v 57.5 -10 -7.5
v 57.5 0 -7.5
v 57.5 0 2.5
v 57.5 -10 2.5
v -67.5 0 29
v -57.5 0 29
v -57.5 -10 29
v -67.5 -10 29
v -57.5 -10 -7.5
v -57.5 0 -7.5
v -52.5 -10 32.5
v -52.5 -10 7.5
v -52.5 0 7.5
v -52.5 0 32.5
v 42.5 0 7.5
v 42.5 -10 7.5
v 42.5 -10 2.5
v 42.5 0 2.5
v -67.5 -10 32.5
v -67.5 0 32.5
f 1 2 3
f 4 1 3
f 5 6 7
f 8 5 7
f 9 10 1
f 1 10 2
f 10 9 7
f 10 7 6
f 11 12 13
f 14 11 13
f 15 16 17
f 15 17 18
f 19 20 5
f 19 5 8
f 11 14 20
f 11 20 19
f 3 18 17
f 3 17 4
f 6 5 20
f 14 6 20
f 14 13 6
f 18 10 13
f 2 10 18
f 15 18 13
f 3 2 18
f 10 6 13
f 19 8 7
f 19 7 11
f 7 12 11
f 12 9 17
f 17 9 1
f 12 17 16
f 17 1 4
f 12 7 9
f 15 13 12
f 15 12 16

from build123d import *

# Parameters (mm, degrees)
F0_W     = 115
F0_H     = 15
F1_DEPTH = 10
F2_W     = 15
F2_H     = 10
F3_DEPTH = 5
F4_W     = 5
F4_H     = 10
F5_DEPTH = 25
F6_W     = 10
F6_H     = 3.5
F7_DEPTH = 10


with BuildPart() as f1:
    # F0 (on Front) → F1 (new body)
    with BuildSketch(Plane.XZ):
        Rectangle(F0_W, F0_H)
    extrude(amount=F1_DEPTH)

    # F2 (on face) → F3 (cut)
    with BuildSketch(Plane.XY.offset(7.5)):
        with Locations((50, -5)):
            Rectangle(F2_W, F2_H)
    extrude(amount=-F3_DEPTH, mode=Mode.SUBTRACT)

    # F4 (on face) → F5 (join)
    with BuildSketch(Plane.XY.offset(7.5)):
        with Locations((-55, -5)):
            Rectangle(F4_W, F4_H)
    extrude(amount=F5_DEPTH)

    # F6 (on face) → F7 (join)
    with BuildSketch(Plane(origin=(-57.5, 0, 0), x_dir=(0, -1, 0), z_dir=(-1, 0, 0))):
        with Locations((5, 30.75)):
            Rectangle(F6_W, F6_H)
    extrude(amount=F7_DEPTH)


solid = f1.part
